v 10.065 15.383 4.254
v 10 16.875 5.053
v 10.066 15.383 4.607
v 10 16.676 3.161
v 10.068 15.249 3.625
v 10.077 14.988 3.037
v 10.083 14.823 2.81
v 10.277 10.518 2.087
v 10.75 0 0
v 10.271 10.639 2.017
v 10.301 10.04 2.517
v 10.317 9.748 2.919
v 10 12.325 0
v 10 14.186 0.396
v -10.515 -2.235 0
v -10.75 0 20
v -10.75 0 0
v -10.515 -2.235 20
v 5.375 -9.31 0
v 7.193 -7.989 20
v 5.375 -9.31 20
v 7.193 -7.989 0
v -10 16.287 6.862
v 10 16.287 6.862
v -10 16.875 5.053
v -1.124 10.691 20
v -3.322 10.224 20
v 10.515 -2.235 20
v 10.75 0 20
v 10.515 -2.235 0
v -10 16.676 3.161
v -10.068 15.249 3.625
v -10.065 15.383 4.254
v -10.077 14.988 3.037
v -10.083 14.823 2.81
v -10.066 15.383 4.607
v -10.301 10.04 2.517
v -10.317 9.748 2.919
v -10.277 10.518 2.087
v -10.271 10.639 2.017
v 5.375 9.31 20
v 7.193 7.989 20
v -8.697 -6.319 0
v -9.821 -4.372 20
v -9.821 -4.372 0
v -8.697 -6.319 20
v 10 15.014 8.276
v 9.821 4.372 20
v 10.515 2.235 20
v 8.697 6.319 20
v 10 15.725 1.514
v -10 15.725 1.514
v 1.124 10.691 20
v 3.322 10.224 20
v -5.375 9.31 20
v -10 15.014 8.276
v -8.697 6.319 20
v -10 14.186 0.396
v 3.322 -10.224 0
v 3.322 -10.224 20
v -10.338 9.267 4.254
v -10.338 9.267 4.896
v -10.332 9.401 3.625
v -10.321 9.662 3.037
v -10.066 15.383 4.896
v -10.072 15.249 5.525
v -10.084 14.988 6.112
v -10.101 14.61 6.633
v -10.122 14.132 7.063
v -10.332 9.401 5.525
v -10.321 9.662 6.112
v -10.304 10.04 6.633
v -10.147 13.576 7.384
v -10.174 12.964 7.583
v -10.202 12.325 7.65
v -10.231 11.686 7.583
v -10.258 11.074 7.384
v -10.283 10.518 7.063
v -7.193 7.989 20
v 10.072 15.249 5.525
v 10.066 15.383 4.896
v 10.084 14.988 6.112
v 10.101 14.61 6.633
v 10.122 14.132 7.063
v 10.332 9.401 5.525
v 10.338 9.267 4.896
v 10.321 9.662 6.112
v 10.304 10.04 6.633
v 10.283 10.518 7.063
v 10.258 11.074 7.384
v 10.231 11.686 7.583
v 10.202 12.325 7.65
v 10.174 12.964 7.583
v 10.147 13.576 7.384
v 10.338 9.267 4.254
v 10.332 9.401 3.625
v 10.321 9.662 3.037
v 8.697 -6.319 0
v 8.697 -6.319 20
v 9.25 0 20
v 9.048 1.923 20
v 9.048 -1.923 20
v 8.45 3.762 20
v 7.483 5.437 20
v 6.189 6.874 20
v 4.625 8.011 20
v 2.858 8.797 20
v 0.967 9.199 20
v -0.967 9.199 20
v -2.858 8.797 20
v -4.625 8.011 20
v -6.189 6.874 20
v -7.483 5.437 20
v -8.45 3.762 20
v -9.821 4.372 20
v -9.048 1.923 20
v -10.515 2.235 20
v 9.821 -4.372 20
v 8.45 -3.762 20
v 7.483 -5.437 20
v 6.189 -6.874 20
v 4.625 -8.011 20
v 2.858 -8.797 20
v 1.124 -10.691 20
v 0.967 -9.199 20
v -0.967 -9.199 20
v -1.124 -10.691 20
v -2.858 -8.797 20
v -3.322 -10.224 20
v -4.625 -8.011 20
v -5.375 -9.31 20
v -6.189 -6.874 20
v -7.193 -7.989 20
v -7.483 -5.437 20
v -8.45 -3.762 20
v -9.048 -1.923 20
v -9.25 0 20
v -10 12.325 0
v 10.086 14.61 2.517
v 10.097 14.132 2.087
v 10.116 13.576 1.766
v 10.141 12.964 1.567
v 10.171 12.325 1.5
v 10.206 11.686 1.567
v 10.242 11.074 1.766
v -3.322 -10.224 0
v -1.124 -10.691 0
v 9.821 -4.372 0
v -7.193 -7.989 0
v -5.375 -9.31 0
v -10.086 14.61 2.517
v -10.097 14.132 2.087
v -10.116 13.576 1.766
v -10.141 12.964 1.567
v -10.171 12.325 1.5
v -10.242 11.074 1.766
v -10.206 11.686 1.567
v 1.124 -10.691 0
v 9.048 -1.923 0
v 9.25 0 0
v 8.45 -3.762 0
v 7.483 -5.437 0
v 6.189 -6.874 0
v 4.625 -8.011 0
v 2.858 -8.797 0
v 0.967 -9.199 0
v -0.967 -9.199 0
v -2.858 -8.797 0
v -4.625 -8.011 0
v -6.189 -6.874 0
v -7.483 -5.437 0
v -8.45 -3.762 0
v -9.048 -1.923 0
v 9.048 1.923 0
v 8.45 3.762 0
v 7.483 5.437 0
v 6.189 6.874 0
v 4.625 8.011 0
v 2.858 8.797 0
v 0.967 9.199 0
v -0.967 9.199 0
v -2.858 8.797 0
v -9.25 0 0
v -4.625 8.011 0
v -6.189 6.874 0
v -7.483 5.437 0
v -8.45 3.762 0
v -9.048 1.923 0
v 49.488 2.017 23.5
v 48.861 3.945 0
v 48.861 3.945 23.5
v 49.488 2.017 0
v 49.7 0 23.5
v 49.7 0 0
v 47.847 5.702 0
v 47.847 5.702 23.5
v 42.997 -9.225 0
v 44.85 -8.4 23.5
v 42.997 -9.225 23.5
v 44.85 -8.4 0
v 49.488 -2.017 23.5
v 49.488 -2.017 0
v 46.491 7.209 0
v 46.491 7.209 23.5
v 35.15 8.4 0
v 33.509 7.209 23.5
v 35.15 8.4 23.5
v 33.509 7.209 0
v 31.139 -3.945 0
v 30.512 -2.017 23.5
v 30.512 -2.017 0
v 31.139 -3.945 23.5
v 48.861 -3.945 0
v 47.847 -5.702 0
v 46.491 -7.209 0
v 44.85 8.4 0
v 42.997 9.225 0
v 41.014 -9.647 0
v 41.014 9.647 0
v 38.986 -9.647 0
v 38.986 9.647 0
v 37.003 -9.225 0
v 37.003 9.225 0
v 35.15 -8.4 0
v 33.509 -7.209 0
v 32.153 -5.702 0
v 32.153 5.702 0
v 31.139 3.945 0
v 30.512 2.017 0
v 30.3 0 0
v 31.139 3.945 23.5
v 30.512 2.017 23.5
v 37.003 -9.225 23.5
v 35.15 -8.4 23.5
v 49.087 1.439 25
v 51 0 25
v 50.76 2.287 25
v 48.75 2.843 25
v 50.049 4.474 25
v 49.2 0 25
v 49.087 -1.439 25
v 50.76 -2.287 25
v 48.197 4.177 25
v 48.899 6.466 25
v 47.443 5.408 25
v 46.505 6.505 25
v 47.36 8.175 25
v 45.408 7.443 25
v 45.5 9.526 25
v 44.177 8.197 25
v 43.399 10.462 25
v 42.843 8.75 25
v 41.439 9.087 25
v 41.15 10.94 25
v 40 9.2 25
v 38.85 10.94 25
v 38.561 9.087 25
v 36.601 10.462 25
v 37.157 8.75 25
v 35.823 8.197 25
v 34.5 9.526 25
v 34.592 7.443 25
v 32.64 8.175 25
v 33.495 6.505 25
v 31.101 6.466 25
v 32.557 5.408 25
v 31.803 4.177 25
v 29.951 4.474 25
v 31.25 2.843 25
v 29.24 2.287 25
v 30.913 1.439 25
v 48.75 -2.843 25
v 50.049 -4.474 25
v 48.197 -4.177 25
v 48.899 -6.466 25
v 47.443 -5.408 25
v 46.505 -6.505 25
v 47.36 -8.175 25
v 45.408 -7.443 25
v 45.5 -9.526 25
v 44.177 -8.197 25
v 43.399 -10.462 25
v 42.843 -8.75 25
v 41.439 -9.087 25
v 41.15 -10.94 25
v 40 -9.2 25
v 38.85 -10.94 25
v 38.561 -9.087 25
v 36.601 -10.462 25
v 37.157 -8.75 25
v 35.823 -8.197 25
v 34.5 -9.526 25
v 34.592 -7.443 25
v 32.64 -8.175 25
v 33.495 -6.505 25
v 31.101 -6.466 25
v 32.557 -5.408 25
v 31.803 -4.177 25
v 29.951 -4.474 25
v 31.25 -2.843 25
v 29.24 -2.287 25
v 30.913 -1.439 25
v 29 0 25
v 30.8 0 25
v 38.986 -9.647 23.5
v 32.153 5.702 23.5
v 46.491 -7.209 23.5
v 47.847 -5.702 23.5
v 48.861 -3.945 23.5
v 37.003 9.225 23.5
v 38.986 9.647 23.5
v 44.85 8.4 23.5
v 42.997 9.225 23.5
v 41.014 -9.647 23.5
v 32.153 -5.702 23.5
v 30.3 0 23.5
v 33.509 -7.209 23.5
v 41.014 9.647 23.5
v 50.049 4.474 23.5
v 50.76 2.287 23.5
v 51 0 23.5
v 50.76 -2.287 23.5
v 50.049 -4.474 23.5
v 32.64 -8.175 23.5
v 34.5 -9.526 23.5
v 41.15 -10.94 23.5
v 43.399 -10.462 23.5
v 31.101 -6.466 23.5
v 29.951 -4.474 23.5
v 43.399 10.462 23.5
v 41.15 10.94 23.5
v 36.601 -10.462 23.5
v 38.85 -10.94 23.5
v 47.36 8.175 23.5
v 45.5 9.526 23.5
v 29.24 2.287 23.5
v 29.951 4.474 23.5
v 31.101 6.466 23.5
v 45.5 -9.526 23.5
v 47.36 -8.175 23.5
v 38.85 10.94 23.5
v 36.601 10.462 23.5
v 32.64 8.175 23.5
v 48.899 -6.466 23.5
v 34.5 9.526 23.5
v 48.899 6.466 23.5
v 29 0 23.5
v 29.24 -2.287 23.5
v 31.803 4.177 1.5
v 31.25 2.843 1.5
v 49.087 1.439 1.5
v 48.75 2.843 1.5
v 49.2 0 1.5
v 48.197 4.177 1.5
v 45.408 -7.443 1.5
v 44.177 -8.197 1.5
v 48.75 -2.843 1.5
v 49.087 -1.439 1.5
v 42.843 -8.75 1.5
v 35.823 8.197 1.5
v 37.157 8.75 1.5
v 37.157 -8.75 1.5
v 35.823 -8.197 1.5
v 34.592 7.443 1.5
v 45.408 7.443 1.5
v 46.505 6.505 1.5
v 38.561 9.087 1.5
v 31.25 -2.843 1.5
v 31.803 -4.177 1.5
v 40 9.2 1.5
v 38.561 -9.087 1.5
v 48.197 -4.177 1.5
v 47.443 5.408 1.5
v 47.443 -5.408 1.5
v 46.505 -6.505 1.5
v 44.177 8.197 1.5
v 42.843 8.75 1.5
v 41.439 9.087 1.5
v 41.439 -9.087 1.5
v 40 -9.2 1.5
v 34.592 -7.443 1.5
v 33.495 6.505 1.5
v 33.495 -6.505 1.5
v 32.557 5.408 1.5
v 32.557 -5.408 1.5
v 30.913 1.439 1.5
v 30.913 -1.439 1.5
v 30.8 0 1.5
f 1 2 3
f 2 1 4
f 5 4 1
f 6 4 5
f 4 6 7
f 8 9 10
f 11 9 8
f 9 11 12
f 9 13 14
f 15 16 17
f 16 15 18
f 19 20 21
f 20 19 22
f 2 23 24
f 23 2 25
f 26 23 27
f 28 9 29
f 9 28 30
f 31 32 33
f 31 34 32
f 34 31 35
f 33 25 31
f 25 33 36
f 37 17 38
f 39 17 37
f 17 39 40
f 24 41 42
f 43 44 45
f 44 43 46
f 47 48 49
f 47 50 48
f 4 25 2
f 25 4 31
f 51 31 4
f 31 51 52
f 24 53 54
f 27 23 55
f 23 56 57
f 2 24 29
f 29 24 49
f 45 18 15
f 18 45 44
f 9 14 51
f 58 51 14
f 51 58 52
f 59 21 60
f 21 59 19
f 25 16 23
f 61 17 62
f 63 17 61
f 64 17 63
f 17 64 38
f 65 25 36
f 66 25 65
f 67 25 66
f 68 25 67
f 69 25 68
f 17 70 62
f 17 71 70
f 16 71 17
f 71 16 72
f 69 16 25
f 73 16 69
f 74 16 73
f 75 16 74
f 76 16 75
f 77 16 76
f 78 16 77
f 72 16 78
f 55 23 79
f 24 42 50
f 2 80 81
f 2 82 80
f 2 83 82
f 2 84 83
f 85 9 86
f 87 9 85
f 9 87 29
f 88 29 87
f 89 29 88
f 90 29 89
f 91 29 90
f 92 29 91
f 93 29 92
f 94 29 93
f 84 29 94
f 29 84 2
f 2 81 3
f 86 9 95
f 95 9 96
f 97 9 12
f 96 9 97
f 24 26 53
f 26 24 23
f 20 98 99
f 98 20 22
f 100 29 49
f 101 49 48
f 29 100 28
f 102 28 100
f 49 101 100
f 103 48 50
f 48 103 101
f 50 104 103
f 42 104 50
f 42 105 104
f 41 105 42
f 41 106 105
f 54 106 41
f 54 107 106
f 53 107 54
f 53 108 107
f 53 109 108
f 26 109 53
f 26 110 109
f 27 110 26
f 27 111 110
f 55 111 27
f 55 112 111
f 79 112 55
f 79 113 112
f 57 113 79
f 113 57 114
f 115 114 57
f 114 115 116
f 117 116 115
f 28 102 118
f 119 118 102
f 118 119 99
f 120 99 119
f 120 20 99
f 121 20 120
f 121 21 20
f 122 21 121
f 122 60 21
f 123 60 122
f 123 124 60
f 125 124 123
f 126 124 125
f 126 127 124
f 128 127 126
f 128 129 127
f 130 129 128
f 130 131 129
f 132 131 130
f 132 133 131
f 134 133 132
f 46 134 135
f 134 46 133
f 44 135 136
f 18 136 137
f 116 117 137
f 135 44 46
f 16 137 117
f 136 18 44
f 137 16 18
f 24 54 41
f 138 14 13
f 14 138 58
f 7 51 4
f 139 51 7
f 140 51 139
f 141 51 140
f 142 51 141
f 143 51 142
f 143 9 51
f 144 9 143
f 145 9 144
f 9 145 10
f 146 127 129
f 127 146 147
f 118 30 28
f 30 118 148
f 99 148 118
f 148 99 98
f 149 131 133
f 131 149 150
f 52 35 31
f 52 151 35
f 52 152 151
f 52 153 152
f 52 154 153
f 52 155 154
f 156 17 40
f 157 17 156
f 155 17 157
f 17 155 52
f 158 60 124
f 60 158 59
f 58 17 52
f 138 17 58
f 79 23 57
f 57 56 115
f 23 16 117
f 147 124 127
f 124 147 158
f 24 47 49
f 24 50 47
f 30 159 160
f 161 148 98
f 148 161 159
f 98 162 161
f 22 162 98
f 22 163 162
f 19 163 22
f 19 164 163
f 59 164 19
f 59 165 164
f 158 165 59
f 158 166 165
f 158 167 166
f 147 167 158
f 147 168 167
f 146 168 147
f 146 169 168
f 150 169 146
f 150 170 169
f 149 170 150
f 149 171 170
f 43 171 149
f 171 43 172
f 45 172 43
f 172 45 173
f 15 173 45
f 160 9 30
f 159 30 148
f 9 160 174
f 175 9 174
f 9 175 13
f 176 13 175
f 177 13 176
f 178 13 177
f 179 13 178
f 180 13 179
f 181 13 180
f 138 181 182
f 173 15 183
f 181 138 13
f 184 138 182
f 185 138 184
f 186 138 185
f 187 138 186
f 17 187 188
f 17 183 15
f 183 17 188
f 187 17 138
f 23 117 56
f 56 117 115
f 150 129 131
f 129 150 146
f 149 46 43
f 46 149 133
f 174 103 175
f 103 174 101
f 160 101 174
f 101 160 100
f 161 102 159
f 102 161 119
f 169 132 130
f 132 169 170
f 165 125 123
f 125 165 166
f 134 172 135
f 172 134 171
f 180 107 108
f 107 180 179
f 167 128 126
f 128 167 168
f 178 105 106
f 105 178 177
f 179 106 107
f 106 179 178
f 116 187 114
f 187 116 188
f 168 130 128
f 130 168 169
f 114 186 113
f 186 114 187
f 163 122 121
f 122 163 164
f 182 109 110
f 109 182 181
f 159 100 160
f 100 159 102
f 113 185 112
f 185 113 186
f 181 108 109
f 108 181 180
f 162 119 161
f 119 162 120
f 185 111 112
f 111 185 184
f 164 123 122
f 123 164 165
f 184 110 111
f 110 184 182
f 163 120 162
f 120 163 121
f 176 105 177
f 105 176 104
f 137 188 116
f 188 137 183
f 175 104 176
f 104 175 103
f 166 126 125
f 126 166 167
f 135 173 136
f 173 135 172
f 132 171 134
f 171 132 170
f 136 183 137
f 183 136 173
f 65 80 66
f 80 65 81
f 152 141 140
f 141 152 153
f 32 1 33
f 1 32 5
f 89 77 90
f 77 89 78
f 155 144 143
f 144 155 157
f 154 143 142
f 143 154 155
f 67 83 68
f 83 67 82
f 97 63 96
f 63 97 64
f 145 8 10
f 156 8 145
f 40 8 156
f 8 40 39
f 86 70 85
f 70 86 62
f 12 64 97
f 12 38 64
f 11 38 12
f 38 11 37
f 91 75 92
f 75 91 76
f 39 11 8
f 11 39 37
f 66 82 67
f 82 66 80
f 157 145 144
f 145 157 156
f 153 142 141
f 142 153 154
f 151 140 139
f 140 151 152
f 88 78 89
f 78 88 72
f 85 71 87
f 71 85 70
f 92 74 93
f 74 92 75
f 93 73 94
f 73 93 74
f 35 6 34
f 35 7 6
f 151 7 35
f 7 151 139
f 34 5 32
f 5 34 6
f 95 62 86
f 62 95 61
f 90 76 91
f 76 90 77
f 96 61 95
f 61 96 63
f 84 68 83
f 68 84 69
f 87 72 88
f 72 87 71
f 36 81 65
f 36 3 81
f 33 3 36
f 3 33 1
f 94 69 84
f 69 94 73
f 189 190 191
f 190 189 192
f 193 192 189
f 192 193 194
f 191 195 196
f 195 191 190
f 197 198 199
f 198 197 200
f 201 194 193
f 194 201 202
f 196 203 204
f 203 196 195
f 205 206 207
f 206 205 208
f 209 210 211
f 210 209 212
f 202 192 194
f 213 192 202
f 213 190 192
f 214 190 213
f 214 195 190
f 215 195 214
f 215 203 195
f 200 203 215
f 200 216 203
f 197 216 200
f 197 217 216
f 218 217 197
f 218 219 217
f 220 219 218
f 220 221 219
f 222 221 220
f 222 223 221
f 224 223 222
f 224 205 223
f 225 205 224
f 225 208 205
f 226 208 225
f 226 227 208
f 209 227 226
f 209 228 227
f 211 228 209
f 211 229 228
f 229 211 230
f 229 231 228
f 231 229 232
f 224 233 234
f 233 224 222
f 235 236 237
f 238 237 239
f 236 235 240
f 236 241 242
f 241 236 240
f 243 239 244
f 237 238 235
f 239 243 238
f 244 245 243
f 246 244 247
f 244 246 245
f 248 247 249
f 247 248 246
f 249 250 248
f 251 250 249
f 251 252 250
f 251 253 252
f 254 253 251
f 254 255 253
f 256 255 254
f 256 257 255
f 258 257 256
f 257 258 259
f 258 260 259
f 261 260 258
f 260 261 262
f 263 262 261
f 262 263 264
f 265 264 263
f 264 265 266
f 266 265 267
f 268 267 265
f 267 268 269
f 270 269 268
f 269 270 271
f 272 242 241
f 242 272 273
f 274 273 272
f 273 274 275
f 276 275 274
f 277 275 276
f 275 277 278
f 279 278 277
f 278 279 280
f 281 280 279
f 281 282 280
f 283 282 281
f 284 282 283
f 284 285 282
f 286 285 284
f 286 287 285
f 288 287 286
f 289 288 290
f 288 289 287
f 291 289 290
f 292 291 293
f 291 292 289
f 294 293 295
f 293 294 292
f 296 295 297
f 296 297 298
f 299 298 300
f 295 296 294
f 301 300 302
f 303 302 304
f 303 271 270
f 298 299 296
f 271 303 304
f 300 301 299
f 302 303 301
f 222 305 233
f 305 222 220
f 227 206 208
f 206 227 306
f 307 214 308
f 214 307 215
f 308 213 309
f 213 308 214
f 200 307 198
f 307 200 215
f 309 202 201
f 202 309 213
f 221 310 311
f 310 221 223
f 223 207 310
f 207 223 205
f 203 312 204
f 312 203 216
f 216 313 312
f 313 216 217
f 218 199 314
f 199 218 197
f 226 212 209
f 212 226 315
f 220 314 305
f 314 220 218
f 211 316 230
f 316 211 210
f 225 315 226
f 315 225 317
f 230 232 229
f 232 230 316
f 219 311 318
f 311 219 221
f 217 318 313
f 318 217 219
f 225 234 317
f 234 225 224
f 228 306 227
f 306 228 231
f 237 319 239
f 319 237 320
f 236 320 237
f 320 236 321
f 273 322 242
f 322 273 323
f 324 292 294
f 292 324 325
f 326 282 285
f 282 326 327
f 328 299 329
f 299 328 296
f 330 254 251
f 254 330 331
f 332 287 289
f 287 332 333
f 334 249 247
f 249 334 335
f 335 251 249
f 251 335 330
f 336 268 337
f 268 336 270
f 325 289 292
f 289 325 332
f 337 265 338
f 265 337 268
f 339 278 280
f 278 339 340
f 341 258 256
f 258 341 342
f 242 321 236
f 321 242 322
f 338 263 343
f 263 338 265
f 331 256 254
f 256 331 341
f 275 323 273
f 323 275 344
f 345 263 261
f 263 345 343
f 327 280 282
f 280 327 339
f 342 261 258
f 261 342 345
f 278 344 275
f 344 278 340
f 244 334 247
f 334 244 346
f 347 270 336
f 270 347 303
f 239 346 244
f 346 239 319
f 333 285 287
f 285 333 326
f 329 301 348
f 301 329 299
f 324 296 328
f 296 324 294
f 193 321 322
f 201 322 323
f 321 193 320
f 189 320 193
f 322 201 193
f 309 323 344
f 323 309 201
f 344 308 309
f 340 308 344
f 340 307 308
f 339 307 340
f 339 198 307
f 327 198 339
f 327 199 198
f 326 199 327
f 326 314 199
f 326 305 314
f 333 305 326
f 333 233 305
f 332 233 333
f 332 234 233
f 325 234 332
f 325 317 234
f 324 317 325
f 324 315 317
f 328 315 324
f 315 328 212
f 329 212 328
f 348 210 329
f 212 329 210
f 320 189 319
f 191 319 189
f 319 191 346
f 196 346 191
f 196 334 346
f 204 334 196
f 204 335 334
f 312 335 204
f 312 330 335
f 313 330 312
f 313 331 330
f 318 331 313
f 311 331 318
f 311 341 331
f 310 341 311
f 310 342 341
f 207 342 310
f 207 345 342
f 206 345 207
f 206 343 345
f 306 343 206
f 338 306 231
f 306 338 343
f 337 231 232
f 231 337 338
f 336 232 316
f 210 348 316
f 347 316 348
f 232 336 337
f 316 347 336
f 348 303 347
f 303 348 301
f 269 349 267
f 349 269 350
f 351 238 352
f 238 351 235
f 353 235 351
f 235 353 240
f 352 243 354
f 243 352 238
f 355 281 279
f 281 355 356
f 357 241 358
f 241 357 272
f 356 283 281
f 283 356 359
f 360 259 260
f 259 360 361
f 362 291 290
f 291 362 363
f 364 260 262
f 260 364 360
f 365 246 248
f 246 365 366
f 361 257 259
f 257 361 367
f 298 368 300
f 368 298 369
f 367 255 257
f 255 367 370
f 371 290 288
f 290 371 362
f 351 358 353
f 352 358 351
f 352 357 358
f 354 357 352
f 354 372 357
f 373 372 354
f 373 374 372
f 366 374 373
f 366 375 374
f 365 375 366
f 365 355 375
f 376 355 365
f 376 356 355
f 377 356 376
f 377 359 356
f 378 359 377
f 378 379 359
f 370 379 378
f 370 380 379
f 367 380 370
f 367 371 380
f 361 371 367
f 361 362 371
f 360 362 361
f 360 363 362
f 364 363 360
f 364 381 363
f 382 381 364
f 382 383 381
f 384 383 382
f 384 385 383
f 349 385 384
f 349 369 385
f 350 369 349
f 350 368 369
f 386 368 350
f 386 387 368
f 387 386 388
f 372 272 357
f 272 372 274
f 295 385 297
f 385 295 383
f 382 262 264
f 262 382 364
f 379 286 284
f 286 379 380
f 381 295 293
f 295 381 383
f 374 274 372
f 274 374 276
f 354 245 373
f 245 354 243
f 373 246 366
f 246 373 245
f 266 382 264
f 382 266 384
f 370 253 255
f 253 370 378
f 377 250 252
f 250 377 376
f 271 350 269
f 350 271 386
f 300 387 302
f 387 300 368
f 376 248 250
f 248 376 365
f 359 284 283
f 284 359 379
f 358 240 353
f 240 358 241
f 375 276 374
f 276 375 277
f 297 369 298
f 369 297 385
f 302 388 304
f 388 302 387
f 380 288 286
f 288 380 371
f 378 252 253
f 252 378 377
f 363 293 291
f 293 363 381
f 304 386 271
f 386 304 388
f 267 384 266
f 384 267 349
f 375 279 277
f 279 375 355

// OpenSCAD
// Which one would you like to see?
part = "both"; // [barHolder,foot,both]

// the outer diameter of the vertical tube
vTubeD = 18;

// thickness of material
dMat = 1.5;

// the height in z
h=20;

// the diameter of the horizontal bar
hBarD = 6;

/* [Hidden] */
ff = 1.5;       // Fummelfaktor um die Unterseite glatt zu bekommen
dStange = hBarD + .15;
dInnen = vTubeD+.5; // soll sich leicht drehen koennen
lStange=dInnen+dMat;    // die Laenge des horizontalen Teiles, kann auch groesser gemacht werden

module Stangenhalter(){
    difference(){
        hull() union(){
            // die Huelse um das Standrohr
            cylinder(d=dInnen+dMat*2, h);
            // der Halter fuer die waagerechte Stange
            translate([-lStange/2,dInnen/2+dStange/2,dStange/2+ff]) rotate([0,90,0])
                cylinder(d=dStange+dMat*2, h=lStange);
        }
        // nach dem Erzeugen der Huelle die Loecher abziehen, einmal das Standrohr
        translate([0,0,-.1]) cylinder(d=dInnen, h+.2, $fn=30);
        // und fuer die waagerechte Stange
        translate([-lStange/2-1,dInnen/2+dStange/2,dStange/2+ff]) rotate([0,90,0])
            cylinder(d=dStange, h=lStange+2, $fn=30);
    }
}

// der FussAdapter fuer eine 20er Bohrung
module FussAdapter(){
    height=25;
    difference(){
        union(){
            cylinder(h=height, d=19.4); // soll in ein 20er Loch
            translate([0,0,height-dMat])cylinder(h=dMat, d=22);   // oben einen Rand
        }
        translate([0,0,dMat])cylinder(h=height+.2, d=18.4, $fn=40); // war 18.3
    }
}

if(part=="both" || part=="barHolder"){
    Stangenhalter();
}
if(part=="both" || part=="foot"){
    translate([40,0,0]) FussAdapter();
}
